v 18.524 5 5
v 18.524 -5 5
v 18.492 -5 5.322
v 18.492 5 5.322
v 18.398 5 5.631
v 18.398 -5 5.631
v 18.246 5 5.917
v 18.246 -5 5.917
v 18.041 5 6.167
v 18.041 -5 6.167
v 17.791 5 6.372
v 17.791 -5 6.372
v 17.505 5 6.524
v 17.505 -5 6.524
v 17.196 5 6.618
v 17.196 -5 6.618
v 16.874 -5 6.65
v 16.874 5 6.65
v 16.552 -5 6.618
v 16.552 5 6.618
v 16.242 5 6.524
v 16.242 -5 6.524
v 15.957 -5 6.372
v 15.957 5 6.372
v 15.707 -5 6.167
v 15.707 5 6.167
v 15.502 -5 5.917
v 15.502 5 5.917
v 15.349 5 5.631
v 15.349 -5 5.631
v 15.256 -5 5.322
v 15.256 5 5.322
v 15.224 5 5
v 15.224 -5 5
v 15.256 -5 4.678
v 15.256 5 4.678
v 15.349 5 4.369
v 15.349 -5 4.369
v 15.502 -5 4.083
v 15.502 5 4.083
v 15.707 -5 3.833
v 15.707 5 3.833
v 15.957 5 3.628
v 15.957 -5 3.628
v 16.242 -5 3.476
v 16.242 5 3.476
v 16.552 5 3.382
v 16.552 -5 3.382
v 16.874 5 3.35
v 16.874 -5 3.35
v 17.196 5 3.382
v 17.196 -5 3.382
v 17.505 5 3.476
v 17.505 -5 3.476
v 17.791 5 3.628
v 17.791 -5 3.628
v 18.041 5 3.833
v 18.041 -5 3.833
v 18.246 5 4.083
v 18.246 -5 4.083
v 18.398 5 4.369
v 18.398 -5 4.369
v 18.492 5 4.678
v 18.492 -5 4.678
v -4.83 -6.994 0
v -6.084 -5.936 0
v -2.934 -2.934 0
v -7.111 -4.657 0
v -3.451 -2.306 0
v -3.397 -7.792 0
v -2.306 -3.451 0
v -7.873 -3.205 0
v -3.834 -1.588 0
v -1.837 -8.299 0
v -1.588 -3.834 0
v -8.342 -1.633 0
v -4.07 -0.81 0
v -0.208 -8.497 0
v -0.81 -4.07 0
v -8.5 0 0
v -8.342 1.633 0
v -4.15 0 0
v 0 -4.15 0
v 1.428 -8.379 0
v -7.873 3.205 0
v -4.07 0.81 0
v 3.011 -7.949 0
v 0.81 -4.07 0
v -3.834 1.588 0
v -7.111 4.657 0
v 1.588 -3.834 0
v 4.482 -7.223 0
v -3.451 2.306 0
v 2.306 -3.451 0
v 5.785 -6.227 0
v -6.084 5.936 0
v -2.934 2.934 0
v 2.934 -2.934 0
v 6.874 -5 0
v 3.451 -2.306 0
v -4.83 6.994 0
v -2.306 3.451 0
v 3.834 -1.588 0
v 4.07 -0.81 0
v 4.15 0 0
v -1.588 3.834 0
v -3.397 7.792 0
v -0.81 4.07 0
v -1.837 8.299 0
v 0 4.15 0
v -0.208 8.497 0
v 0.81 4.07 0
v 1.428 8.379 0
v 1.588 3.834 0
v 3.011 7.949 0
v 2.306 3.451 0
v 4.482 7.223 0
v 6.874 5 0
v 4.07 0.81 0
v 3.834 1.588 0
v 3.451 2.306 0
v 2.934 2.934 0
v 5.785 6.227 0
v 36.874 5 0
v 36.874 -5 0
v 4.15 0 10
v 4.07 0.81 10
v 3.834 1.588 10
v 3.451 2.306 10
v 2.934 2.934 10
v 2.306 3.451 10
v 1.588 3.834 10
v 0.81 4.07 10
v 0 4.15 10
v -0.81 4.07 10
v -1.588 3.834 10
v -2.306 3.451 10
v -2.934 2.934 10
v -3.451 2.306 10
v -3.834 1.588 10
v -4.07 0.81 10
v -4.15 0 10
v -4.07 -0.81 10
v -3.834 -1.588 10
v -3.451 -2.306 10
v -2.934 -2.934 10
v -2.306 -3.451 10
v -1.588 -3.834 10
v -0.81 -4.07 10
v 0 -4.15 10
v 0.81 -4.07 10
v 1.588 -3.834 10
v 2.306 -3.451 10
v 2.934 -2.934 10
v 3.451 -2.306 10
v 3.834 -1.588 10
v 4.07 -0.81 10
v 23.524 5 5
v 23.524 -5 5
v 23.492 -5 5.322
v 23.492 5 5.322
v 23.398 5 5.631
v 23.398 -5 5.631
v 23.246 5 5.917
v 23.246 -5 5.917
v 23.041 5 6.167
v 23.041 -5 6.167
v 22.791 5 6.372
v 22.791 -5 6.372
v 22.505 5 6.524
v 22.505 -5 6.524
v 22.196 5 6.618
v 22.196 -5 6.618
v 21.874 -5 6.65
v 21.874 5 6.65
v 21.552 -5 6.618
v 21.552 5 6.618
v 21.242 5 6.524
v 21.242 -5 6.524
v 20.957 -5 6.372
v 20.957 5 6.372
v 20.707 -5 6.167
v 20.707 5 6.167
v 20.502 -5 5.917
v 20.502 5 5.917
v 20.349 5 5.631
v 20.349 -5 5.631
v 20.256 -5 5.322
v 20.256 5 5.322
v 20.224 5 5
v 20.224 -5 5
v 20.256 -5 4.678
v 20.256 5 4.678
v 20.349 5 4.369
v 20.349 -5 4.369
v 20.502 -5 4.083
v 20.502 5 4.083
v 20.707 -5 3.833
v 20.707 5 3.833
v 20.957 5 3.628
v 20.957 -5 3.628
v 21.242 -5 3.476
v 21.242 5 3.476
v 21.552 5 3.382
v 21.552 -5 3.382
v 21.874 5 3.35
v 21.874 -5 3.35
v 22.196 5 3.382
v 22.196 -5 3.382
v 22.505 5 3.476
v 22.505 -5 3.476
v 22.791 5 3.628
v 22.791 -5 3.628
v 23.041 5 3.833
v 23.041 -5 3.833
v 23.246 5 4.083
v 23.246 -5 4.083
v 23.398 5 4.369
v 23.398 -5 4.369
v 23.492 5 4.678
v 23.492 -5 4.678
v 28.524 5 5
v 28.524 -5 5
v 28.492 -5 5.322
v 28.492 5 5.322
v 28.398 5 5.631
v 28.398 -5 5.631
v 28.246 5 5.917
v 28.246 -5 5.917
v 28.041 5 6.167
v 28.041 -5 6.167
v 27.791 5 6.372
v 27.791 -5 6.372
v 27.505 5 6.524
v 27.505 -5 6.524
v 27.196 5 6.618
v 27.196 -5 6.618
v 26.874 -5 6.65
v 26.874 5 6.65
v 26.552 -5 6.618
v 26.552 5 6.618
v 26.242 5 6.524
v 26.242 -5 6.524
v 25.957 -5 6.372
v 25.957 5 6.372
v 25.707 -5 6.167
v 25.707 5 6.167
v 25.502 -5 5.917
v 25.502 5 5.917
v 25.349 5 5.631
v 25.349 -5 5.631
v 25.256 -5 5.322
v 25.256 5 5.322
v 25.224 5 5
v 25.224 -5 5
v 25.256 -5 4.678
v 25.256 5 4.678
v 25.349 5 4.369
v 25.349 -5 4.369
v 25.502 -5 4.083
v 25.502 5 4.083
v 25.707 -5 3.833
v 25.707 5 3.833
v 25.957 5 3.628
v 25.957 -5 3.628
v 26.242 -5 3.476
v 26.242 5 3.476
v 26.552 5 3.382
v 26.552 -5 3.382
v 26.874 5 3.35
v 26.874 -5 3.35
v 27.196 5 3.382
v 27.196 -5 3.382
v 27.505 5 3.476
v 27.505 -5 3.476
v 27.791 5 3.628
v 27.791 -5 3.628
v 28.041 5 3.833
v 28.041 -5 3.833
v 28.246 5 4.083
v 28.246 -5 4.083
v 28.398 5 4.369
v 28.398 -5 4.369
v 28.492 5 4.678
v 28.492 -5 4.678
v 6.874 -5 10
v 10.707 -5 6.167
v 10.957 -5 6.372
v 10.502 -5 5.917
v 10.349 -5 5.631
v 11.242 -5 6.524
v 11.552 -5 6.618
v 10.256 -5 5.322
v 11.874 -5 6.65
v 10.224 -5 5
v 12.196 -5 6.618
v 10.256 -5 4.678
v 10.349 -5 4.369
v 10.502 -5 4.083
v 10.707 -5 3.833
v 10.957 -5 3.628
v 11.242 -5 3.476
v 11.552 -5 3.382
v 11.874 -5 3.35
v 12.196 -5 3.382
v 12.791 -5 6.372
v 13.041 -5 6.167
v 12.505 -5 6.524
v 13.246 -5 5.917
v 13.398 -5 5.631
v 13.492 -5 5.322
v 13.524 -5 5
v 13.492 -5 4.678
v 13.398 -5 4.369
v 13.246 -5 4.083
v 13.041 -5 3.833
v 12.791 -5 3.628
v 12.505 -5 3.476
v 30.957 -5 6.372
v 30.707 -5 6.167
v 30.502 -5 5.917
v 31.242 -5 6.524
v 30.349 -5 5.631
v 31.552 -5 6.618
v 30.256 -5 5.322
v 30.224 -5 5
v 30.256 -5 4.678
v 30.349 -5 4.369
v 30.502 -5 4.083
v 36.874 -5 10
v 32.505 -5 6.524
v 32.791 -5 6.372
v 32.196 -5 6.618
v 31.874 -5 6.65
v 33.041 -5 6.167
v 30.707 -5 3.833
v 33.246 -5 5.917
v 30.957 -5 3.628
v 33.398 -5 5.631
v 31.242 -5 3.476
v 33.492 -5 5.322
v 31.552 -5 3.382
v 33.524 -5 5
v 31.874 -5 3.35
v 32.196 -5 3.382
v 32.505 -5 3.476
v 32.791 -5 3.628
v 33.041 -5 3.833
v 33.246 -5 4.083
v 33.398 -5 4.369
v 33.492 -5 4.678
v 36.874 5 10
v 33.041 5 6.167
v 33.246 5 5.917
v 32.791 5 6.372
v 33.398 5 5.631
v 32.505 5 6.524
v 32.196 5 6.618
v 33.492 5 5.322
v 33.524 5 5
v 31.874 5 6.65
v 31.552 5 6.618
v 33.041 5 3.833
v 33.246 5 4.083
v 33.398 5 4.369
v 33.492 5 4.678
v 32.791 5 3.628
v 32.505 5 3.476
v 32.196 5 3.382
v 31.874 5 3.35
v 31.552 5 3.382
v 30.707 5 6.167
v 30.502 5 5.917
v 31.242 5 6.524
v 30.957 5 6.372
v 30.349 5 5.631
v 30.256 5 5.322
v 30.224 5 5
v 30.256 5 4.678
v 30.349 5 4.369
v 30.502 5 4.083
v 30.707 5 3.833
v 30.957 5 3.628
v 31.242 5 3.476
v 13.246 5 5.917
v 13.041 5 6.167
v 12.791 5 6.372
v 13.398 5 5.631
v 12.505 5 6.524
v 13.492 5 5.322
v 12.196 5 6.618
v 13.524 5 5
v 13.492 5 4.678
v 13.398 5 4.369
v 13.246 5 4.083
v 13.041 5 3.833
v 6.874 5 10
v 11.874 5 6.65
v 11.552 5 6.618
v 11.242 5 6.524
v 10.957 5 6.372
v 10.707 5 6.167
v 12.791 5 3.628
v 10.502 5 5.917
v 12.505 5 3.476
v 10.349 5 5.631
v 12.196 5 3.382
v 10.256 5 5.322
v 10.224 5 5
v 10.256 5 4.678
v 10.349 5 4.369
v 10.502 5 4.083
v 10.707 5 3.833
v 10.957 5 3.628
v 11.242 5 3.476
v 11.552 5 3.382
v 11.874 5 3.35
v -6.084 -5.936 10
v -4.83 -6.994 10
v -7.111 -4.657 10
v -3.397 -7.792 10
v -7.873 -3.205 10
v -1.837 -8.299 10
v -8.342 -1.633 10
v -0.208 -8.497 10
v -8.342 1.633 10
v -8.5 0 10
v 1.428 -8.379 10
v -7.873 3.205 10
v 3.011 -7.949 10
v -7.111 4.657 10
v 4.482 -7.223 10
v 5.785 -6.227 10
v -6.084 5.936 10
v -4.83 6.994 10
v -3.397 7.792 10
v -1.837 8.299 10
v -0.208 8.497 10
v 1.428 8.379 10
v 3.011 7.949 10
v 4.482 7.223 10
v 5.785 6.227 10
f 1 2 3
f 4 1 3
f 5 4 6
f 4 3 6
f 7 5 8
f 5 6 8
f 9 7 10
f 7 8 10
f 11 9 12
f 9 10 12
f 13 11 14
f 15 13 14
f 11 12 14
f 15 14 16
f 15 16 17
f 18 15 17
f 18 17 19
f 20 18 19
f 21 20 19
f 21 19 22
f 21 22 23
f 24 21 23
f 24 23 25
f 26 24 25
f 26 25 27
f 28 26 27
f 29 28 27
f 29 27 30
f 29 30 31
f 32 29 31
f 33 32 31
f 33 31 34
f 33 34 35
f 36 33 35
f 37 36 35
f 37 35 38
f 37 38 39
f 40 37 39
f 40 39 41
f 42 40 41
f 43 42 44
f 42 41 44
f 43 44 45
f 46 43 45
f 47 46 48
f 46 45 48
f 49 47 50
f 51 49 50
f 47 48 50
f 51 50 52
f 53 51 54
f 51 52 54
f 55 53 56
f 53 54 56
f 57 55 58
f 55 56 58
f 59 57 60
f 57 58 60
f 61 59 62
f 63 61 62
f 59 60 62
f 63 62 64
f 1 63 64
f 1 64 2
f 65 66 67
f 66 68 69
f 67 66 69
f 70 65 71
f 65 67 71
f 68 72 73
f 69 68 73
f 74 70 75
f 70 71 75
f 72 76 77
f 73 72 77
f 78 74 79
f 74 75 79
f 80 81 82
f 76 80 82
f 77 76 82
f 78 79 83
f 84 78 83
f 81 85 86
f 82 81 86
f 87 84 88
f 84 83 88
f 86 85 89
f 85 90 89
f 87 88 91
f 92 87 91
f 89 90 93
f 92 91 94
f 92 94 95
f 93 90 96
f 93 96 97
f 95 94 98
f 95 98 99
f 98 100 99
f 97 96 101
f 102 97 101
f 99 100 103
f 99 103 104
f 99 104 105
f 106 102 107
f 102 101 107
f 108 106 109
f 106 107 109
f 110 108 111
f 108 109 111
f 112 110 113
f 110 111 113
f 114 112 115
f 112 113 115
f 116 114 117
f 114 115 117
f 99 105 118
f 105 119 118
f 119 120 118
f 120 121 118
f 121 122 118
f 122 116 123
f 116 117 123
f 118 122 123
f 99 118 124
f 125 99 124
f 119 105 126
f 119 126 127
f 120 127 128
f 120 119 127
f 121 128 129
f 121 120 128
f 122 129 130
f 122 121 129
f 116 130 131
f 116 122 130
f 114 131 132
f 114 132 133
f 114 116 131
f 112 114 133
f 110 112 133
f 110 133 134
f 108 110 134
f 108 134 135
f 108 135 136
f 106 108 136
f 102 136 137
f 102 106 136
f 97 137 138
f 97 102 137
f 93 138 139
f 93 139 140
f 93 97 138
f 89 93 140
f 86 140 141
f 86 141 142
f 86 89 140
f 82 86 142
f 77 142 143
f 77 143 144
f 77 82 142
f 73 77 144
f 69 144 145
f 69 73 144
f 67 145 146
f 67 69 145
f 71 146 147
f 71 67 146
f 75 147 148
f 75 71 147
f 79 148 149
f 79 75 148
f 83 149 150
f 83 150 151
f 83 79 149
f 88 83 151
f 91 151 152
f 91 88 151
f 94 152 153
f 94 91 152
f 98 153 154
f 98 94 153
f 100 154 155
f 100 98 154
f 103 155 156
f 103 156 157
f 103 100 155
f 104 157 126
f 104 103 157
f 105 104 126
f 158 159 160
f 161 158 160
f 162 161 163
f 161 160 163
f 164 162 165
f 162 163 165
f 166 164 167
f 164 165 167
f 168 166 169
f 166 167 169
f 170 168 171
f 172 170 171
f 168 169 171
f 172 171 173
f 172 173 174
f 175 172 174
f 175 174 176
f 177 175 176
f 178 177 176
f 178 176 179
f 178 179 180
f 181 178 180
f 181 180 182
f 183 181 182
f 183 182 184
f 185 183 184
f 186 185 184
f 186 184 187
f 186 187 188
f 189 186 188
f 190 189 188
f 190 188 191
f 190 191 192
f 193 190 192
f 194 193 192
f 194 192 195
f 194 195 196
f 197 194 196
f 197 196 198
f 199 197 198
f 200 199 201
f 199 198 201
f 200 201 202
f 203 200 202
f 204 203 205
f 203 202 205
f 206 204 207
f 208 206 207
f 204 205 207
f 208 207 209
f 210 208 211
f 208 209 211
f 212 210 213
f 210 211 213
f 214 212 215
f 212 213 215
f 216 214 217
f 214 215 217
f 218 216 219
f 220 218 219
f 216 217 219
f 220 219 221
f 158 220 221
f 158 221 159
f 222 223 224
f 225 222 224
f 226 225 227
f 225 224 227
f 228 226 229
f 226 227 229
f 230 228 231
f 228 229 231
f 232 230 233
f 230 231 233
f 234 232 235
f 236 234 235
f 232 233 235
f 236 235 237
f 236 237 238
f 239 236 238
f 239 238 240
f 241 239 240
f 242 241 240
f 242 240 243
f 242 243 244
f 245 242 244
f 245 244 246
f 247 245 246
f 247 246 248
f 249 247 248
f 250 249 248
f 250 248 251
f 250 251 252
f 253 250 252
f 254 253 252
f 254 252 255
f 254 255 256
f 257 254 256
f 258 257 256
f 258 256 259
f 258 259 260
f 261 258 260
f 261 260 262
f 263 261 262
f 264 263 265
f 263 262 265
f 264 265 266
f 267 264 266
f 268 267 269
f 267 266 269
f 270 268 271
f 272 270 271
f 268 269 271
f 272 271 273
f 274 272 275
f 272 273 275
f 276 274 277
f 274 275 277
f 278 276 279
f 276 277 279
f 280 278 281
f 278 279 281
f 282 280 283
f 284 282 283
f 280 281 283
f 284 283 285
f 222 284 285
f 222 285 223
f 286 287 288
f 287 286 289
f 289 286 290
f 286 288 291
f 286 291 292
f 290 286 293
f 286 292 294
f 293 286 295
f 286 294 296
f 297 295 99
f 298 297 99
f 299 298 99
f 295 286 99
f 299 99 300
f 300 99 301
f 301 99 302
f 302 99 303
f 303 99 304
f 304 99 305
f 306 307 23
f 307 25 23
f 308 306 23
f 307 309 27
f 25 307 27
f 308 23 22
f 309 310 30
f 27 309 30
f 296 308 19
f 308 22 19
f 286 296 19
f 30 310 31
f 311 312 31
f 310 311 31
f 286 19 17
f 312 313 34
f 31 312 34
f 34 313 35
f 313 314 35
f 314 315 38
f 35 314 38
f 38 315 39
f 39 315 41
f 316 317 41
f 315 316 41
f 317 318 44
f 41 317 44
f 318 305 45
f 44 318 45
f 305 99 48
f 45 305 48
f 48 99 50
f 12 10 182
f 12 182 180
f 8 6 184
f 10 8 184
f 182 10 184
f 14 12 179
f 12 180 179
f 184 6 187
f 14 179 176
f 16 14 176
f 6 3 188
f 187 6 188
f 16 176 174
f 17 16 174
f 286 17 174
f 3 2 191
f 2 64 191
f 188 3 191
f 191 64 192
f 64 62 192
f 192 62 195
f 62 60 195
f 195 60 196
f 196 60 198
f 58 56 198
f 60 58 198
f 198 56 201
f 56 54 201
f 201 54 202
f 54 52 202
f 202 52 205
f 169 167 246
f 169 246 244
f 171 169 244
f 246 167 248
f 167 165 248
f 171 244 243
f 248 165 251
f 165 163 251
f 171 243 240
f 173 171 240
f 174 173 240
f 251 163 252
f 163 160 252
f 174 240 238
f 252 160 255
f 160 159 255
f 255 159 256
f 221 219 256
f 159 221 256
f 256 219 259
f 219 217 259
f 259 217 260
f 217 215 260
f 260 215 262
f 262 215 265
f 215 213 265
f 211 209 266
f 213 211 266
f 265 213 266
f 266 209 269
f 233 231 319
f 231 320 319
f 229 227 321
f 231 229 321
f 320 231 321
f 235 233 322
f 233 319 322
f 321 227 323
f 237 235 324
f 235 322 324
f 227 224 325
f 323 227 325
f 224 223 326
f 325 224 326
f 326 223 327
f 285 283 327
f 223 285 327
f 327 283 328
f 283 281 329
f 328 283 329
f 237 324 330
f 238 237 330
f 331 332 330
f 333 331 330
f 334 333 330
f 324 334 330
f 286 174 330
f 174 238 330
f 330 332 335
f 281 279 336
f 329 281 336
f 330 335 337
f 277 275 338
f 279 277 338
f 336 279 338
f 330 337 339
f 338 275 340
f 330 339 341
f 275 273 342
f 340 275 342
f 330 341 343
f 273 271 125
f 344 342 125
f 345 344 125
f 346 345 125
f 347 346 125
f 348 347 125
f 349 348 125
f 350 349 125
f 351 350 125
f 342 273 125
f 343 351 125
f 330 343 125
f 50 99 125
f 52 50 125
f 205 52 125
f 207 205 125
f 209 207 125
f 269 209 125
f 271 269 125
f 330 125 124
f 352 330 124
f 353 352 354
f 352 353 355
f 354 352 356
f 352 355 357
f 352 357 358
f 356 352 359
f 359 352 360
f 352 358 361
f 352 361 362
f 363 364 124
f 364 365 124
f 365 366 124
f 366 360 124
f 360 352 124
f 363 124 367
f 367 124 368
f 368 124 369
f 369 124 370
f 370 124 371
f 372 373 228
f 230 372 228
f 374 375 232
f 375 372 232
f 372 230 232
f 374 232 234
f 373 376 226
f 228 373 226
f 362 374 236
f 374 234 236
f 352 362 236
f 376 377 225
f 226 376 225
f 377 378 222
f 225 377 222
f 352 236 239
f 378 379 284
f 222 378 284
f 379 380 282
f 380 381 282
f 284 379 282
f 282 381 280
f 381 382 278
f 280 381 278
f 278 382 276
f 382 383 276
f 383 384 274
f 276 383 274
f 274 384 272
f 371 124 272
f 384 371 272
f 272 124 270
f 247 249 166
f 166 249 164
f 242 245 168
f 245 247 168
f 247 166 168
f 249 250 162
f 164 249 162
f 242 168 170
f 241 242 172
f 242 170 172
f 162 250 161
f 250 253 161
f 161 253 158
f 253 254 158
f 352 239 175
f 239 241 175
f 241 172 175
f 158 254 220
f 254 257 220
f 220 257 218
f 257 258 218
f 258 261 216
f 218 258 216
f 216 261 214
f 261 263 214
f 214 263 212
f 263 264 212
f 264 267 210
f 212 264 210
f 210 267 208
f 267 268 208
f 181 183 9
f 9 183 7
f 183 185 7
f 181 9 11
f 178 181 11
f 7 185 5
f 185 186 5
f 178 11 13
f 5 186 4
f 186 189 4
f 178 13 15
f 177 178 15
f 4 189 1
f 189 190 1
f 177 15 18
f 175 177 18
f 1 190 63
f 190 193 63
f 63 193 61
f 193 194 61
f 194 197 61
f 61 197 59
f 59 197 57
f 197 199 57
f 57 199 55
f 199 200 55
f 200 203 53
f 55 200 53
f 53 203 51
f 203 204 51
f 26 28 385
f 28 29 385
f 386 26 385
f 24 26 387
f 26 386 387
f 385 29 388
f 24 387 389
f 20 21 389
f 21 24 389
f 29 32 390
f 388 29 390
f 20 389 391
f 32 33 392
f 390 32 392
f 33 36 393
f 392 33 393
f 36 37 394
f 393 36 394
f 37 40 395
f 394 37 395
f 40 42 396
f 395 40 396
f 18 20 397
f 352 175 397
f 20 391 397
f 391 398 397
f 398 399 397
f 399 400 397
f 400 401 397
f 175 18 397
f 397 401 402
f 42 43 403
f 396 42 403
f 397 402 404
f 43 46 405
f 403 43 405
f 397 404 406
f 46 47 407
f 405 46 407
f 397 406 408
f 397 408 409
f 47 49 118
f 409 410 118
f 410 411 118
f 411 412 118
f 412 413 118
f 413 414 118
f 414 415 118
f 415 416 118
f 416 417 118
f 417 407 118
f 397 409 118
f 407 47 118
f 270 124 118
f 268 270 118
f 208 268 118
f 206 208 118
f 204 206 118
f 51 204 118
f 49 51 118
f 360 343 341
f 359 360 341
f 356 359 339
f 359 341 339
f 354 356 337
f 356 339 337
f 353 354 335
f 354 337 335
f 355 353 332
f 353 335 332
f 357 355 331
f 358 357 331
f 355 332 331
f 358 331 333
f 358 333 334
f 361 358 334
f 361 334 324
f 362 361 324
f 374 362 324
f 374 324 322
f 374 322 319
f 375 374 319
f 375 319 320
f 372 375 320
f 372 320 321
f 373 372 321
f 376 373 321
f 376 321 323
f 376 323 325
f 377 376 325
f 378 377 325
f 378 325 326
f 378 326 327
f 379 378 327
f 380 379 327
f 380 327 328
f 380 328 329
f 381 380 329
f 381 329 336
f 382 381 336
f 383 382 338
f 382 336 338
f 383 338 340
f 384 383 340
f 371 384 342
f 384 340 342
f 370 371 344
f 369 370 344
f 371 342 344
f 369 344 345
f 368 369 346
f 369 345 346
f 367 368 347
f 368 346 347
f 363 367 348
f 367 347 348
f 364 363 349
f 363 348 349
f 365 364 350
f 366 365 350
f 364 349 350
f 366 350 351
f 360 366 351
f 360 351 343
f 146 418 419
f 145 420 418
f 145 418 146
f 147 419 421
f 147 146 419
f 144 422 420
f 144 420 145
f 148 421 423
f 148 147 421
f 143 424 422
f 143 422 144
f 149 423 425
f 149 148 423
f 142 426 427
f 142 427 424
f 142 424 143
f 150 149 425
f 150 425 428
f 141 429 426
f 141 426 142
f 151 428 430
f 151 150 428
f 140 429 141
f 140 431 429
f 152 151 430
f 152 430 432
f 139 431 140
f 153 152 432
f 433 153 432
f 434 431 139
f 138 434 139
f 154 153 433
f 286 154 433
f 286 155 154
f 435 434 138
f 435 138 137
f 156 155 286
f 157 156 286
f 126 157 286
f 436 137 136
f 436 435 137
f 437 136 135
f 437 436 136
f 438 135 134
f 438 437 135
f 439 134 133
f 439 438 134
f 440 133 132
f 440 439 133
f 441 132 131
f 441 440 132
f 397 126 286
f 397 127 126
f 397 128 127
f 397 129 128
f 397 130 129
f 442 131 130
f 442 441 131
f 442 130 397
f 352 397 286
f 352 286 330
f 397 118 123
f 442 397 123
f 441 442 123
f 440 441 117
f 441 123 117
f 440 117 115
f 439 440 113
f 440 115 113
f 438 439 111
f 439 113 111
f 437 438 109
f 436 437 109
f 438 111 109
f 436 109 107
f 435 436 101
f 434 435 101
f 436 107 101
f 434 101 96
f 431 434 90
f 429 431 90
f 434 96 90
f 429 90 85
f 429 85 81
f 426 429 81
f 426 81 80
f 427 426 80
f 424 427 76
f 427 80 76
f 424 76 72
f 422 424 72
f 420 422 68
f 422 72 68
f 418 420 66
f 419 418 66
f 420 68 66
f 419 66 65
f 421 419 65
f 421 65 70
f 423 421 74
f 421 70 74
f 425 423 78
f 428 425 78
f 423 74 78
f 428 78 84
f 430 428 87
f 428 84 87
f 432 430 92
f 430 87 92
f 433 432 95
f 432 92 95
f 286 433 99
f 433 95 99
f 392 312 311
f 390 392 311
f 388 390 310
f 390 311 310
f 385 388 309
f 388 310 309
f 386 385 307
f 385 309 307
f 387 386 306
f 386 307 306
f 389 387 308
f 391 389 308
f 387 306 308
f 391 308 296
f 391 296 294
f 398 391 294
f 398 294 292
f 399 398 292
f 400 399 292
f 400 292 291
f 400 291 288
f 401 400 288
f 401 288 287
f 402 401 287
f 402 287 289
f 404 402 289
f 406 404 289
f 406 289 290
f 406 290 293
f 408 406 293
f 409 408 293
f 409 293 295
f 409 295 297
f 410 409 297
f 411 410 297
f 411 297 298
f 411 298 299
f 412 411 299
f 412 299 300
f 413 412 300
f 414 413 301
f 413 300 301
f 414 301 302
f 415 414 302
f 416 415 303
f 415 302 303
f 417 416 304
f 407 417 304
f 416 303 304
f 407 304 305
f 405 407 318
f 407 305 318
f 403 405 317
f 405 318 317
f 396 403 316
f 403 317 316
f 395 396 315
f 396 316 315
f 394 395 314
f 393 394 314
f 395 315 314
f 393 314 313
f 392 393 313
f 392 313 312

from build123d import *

# Parameters (mm, degrees)
F0_R     = 4.15
F1_DEPTH = 10
F2_R     = 1.65
F3_DEPTH = 25


with BuildPart() as f1:
    # F0 (on Top) → F1 (new body)
    with BuildSketch(Plane.XY):
        with BuildLine():
            Line((6.873864, -5), (6.873864, 5))
            ThreePointArc((6.873864, 5), (-8.5, 0), (6.873864, -5))
        make_face()
        Circle(F0_R, mode=Mode.SUBTRACT)
        with BuildLine():
            ThreePointArc((6.873864, -5), (8.083249, -2.628893), (8.5, 0))
            ThreePointArc((8.5, 0), (8.083249, 2.628893), (6.873864, 5))
            Line((6.873864, 5), (6.873864, -5))
        make_face()
        with BuildLine():
            ThreePointArc((6.873864, 5), (8.083249, 2.628893), (8.5, 0))
            ThreePointArc((8.5, 0), (8.083249, -2.628893), (6.873864, -5))
            Line((6.873864, -5), (36.873864, -5))
            Line((36.873864, -5), (36.873864, 5))
            Line((36.873864, 5), (6.873864, 5))
        make_face()
    extrude(amount=F1_DEPTH)

    # F2 (on face) → F3 (cut)
    with BuildSketch(Plane.XZ.offset(5)):
        with Locations((11.873864, 5)):
            Circle(F2_R)
        with Locations((16.873864, 5)):
            Circle(F2_R)
        with Locations((21.873864, 5)):
            Circle(F2_R)
        with Locations((26.873864, 5)):
            Circle(F2_R)
        with Locations((31.873864, 5)):
            Circle(F2_R)
    extrude(amount=-F3_DEPTH, mode=Mode.SUBTRACT)


solid = f1.part
